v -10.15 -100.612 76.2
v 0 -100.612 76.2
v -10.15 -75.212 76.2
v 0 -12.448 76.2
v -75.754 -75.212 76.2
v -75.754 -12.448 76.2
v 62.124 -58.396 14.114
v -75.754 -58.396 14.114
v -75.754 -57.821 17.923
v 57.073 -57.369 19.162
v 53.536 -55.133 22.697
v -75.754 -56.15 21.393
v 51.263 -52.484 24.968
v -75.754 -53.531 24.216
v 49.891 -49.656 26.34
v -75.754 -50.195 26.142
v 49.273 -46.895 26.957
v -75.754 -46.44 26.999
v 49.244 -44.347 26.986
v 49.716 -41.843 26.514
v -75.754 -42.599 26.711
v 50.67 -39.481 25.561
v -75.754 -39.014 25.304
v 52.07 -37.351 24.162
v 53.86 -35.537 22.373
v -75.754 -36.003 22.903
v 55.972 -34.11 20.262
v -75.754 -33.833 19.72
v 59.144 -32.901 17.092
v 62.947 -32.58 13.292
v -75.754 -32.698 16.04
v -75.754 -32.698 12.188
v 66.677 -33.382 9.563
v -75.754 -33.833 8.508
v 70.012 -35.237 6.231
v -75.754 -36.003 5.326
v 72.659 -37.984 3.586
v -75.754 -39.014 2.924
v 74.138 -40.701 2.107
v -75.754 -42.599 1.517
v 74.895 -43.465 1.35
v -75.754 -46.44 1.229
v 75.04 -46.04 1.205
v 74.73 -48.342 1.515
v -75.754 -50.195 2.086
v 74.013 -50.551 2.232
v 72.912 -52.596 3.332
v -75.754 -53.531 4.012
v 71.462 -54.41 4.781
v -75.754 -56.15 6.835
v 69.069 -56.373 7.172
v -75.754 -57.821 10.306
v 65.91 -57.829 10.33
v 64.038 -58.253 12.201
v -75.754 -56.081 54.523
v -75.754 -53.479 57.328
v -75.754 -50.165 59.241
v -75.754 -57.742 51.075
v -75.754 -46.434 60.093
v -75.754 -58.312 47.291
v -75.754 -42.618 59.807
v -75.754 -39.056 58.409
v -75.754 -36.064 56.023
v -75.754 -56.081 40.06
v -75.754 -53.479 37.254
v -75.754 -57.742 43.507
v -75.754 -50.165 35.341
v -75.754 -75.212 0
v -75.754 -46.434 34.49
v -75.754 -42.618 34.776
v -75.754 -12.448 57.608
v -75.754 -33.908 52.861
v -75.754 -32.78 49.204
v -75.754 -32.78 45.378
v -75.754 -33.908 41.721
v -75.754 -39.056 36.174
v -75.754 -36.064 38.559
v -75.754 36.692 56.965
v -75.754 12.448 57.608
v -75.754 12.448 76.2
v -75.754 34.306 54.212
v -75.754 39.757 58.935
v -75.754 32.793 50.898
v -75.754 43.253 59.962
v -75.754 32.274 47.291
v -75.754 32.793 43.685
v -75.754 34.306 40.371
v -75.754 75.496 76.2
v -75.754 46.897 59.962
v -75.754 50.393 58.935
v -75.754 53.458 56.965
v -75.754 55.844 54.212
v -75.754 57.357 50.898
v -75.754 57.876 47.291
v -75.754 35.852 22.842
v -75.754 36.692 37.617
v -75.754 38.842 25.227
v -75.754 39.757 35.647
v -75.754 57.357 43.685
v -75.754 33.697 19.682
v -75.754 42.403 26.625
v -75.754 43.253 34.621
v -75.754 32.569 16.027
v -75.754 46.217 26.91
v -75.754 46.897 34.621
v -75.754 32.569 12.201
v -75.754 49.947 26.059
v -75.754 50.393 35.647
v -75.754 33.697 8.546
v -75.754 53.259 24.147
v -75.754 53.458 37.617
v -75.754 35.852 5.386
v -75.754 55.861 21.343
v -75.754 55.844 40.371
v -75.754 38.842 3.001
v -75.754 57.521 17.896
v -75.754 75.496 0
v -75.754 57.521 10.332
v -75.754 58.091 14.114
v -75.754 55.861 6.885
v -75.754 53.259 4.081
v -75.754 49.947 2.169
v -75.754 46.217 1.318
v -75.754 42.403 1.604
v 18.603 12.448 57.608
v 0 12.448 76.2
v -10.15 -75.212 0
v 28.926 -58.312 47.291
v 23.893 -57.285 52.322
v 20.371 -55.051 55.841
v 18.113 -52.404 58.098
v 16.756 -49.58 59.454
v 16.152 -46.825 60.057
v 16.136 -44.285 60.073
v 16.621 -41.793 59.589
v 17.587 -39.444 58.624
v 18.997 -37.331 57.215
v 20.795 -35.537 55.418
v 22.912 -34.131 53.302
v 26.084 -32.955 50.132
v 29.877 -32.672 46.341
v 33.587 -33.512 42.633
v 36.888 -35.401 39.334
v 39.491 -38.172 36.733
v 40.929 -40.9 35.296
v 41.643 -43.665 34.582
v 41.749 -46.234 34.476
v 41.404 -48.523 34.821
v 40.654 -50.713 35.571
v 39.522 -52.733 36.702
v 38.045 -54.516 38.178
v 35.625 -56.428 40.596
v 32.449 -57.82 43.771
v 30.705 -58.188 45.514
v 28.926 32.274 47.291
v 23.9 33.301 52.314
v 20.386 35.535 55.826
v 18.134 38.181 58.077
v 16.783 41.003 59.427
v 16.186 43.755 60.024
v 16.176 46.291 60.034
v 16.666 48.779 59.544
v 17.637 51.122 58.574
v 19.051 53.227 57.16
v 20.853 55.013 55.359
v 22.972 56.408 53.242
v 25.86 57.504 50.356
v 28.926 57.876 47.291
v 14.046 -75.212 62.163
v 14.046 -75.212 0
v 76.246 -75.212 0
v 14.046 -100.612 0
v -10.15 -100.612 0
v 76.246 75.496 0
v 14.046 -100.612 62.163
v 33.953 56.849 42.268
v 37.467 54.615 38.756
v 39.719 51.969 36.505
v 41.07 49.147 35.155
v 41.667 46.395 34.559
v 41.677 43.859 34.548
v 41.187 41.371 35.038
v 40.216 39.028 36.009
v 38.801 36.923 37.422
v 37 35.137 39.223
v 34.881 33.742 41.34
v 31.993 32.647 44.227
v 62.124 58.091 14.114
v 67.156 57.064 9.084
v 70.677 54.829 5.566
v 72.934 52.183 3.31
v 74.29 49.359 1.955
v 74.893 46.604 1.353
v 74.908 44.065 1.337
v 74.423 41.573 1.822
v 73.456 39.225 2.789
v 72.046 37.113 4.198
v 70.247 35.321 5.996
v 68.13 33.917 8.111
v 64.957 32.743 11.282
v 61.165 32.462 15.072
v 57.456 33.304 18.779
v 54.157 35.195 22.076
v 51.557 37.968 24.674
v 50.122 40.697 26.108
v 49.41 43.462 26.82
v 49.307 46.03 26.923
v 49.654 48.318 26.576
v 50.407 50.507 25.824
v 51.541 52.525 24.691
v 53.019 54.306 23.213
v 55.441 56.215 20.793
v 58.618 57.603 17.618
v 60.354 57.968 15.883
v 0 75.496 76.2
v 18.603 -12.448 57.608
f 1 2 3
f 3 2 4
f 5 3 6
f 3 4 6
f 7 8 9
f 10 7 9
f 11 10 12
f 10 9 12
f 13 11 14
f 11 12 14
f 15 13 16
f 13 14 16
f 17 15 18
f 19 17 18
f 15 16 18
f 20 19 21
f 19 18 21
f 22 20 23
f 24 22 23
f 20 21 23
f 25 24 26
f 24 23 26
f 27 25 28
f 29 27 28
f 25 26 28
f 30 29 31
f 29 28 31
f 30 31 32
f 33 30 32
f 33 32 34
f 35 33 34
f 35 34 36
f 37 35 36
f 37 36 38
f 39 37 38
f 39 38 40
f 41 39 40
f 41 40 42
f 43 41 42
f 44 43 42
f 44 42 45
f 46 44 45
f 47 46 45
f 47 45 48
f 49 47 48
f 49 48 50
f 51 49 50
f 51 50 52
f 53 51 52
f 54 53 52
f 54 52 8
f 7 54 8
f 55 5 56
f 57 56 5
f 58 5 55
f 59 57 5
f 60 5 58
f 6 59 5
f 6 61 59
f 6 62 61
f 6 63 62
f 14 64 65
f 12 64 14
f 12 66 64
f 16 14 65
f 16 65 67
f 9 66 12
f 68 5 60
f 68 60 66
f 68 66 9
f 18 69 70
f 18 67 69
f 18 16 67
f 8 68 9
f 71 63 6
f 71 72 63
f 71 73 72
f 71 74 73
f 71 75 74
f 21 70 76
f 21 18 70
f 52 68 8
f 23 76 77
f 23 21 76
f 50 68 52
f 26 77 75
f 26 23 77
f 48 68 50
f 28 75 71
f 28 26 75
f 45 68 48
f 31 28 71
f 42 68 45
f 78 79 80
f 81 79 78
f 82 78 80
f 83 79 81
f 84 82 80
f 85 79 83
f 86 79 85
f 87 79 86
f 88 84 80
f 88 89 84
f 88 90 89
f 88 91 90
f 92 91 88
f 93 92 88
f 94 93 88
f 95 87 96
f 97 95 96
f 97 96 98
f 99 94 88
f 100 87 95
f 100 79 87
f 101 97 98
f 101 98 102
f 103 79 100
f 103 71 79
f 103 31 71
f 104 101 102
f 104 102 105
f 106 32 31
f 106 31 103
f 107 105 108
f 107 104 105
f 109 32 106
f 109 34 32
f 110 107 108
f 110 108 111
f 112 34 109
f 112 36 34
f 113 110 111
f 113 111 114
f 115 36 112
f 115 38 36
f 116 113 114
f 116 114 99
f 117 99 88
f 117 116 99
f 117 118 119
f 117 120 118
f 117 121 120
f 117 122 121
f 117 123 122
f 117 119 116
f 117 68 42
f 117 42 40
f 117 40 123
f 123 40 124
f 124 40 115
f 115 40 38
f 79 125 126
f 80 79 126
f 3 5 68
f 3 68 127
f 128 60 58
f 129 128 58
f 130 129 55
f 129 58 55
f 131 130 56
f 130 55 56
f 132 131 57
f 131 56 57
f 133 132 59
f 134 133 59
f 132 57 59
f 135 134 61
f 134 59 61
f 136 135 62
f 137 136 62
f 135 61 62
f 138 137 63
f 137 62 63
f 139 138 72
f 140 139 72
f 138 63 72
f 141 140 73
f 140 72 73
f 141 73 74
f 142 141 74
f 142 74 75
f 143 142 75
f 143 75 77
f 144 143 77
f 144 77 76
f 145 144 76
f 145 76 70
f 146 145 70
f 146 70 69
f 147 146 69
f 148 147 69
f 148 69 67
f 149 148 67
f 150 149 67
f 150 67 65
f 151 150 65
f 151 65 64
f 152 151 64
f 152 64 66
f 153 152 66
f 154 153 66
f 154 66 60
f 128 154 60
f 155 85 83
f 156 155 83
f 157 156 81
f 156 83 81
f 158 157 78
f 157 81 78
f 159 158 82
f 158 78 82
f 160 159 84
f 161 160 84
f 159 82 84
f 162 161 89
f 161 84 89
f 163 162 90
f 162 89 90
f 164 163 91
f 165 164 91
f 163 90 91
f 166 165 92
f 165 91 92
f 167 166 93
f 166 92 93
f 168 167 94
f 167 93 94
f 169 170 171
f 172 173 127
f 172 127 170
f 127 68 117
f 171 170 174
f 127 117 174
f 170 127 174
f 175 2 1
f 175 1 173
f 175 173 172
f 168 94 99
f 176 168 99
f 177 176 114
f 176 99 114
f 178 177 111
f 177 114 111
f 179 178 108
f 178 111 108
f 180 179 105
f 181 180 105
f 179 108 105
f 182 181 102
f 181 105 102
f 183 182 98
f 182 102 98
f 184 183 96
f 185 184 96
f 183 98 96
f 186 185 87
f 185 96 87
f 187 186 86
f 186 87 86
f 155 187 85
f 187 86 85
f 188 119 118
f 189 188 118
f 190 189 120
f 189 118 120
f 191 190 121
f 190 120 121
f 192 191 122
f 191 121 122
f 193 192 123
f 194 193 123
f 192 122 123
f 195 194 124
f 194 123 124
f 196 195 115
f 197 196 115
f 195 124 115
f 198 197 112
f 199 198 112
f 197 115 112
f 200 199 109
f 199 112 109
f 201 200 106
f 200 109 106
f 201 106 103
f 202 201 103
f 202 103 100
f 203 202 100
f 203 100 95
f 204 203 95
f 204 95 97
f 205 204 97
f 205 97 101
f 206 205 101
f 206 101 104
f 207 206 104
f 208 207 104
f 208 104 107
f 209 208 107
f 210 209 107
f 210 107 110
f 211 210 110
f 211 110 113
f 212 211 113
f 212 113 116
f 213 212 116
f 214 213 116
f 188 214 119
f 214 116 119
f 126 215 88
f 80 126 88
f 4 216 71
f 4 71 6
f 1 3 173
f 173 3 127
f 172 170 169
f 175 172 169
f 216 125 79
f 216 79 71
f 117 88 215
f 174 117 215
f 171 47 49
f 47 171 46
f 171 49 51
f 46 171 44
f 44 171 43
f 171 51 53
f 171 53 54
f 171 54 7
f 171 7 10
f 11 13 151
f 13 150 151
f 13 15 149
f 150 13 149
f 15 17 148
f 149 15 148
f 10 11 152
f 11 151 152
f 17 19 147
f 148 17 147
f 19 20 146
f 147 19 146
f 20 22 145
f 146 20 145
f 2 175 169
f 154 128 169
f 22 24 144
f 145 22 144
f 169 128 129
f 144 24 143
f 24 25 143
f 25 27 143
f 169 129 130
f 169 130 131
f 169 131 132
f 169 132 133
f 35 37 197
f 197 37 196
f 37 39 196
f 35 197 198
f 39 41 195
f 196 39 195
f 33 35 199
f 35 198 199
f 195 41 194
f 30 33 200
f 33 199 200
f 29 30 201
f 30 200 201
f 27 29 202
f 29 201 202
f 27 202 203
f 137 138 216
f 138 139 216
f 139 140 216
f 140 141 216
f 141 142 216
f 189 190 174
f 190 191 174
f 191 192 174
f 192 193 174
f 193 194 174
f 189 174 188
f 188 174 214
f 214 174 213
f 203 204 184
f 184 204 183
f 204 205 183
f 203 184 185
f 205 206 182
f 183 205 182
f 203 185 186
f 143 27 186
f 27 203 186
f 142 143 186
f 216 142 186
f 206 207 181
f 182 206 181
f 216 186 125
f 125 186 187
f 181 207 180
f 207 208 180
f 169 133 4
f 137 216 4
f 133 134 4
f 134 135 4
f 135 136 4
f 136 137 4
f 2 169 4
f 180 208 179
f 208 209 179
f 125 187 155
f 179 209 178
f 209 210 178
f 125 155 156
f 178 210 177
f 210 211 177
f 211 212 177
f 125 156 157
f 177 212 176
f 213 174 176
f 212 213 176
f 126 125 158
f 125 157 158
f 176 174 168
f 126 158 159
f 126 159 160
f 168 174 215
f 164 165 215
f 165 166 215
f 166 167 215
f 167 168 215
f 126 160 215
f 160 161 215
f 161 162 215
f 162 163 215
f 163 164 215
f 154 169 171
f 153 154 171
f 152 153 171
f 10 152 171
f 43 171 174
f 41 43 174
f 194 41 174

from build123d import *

# Parameters (mm, degrees)
F0_W      = 152.0007625222
F0_H      = 150.7072374225
F1_DEPTH  = 76.2
F3_DEPTH  = 76.2
F4_DEPTH  = 1270
F6_DEPTH  = 25.4
F7_W      = 24.8957742006
F7_H      = 18.5917448044
F8_DEPTH  = 1270
F10_DEPTH = 152.0017625222


with BuildPart() as f1:
    # F0 (on Top) → F1 (new body)
    with BuildSketch(Plane.XY):
        with Locations((0.2458952367, 0.141967088)):
            Rectangle(F0_W, F0_H)
    extrude(amount=F1_DEPTH)

    # F2 (on face) → F3 (cut)
    with BuildSketch(Plane.XZ.offset(75.2116516232)):
        Polygon((76.2462764978, 76.2), (0, 76.2), (76.2462764978, 0), align=None)
    extrude(amount=-F3_DEPTH, mode=Mode.SUBTRACT)

    # F4 (cut): a face of the model
    f4_faces = [f1.faces().sort_by_distance(p)[0] for p in [
        (50.8308509986, 0.9883483768, 50.8),
    ]]
    extrude(f4_faces, amount=-F4_DEPTH, mode=Mode.SUBTRACT)

    # F5 (on face) → F6 (join)
    with BuildSketch(Plane.XZ.offset(75.2116516232)):
        Polygon((0, 76.2), (-10.1499548182, 76.2), (-10.1499548182, 0), (14.0455085784, 0), (14.0455085784, 62.1630161257), align=None)
    extrude(amount=F6_DEPTH)

    # F7 (on face) → F8 (cut)
    with BuildSketch(Plane(origin=(-75.7544860244, 0, 0), x_dir=(0, -1, 0), z_dir=(-1, 0, 0))):
        with Locations((0, 66.9041275978)):
            Rectangle(F7_W, F7_H)
    extrude(amount=-F8_DEPTH, mode=Mode.SUBTRACT)

    # F9 (on face) → F10 (cut, through all)
    with BuildSketch(Plane(origin=(-75.7544860244, 0, 0), x_dir=(0, -1, 0), z_dir=(-1, 0, 0))):
        with BuildLine():
            Line((-57.8758810088, 47.2911335528), (-32.2743262723, 47.2911335528))
            ThreePointArc((-32.2743262723, 47.2911335528), (-45.0751036406, 60.091910921), (-57.8758810088, 47.2911335528))
        make_face()
        with BuildLine():
            ThreePointArc((-57.8758810088, 47.2911335528), (-45.0751036406, 34.4903561846), (-32.2743262723, 47.2911335528))
            Line((-32.2743262723, 47.2911335528), (-57.8758810088, 47.2911335528))
        make_face()
        with BuildLine():
            Line((-58.0906374395, 14.1140213236), (-32.4261682093, 14.1140213236))
            ThreePointArc((-32.4261682093, 14.1140213236), (-45.2584028244, 26.9462559387), (-58.0906374395, 14.1140213236))
        make_face()
        with BuildLine():
            ThreePointArc((-58.0906374395, 14.1140213236), (-45.2584028244, 1.2817867085), (-32.4261682093, 14.1140213236))
            Line((-32.4261682093, 14.1140213236), (-58.0906374395, 14.1140213236))
        make_face()
        with BuildLine():
            ThreePointArc((32.553633581, 14.1140213236), (45.4745851457, 1.1930697589), (58.3955367104, 14.1140213236))
            Line((58.3955367104, 14.1140213236), (32.553633581, 14.1140213236))
        make_face()
        with BuildLine():
            Line((32.553633581, 14.1140213236), (58.3955367104, 14.1140213236))
            ThreePointArc((58.3955367104, 14.1140213236), (45.4745851457, 27.0349728883), (32.553633581, 14.1140213236))
        make_face()
        with BuildLine():
            ThreePointArc((32.6371107909, 47.2911335528), (45.4745851457, 34.453659198), (58.3120595005, 47.2911335528))
            Line((58.3120595005, 47.2911335528), (32.6371107909, 47.2911335528))
        make_face()
        with BuildLine():
            Line((32.6371107909, 47.2911335528), (58.3120595005, 47.2911335528))
            ThreePointArc((58.3120595005, 47.2911335528), (45.4745851457, 60.1286079076), (32.6371107909, 47.2911335528))
        make_face()
    extrude(amount=-F10_DEPTH, mode=Mode.SUBTRACT)


solid = f1.part
